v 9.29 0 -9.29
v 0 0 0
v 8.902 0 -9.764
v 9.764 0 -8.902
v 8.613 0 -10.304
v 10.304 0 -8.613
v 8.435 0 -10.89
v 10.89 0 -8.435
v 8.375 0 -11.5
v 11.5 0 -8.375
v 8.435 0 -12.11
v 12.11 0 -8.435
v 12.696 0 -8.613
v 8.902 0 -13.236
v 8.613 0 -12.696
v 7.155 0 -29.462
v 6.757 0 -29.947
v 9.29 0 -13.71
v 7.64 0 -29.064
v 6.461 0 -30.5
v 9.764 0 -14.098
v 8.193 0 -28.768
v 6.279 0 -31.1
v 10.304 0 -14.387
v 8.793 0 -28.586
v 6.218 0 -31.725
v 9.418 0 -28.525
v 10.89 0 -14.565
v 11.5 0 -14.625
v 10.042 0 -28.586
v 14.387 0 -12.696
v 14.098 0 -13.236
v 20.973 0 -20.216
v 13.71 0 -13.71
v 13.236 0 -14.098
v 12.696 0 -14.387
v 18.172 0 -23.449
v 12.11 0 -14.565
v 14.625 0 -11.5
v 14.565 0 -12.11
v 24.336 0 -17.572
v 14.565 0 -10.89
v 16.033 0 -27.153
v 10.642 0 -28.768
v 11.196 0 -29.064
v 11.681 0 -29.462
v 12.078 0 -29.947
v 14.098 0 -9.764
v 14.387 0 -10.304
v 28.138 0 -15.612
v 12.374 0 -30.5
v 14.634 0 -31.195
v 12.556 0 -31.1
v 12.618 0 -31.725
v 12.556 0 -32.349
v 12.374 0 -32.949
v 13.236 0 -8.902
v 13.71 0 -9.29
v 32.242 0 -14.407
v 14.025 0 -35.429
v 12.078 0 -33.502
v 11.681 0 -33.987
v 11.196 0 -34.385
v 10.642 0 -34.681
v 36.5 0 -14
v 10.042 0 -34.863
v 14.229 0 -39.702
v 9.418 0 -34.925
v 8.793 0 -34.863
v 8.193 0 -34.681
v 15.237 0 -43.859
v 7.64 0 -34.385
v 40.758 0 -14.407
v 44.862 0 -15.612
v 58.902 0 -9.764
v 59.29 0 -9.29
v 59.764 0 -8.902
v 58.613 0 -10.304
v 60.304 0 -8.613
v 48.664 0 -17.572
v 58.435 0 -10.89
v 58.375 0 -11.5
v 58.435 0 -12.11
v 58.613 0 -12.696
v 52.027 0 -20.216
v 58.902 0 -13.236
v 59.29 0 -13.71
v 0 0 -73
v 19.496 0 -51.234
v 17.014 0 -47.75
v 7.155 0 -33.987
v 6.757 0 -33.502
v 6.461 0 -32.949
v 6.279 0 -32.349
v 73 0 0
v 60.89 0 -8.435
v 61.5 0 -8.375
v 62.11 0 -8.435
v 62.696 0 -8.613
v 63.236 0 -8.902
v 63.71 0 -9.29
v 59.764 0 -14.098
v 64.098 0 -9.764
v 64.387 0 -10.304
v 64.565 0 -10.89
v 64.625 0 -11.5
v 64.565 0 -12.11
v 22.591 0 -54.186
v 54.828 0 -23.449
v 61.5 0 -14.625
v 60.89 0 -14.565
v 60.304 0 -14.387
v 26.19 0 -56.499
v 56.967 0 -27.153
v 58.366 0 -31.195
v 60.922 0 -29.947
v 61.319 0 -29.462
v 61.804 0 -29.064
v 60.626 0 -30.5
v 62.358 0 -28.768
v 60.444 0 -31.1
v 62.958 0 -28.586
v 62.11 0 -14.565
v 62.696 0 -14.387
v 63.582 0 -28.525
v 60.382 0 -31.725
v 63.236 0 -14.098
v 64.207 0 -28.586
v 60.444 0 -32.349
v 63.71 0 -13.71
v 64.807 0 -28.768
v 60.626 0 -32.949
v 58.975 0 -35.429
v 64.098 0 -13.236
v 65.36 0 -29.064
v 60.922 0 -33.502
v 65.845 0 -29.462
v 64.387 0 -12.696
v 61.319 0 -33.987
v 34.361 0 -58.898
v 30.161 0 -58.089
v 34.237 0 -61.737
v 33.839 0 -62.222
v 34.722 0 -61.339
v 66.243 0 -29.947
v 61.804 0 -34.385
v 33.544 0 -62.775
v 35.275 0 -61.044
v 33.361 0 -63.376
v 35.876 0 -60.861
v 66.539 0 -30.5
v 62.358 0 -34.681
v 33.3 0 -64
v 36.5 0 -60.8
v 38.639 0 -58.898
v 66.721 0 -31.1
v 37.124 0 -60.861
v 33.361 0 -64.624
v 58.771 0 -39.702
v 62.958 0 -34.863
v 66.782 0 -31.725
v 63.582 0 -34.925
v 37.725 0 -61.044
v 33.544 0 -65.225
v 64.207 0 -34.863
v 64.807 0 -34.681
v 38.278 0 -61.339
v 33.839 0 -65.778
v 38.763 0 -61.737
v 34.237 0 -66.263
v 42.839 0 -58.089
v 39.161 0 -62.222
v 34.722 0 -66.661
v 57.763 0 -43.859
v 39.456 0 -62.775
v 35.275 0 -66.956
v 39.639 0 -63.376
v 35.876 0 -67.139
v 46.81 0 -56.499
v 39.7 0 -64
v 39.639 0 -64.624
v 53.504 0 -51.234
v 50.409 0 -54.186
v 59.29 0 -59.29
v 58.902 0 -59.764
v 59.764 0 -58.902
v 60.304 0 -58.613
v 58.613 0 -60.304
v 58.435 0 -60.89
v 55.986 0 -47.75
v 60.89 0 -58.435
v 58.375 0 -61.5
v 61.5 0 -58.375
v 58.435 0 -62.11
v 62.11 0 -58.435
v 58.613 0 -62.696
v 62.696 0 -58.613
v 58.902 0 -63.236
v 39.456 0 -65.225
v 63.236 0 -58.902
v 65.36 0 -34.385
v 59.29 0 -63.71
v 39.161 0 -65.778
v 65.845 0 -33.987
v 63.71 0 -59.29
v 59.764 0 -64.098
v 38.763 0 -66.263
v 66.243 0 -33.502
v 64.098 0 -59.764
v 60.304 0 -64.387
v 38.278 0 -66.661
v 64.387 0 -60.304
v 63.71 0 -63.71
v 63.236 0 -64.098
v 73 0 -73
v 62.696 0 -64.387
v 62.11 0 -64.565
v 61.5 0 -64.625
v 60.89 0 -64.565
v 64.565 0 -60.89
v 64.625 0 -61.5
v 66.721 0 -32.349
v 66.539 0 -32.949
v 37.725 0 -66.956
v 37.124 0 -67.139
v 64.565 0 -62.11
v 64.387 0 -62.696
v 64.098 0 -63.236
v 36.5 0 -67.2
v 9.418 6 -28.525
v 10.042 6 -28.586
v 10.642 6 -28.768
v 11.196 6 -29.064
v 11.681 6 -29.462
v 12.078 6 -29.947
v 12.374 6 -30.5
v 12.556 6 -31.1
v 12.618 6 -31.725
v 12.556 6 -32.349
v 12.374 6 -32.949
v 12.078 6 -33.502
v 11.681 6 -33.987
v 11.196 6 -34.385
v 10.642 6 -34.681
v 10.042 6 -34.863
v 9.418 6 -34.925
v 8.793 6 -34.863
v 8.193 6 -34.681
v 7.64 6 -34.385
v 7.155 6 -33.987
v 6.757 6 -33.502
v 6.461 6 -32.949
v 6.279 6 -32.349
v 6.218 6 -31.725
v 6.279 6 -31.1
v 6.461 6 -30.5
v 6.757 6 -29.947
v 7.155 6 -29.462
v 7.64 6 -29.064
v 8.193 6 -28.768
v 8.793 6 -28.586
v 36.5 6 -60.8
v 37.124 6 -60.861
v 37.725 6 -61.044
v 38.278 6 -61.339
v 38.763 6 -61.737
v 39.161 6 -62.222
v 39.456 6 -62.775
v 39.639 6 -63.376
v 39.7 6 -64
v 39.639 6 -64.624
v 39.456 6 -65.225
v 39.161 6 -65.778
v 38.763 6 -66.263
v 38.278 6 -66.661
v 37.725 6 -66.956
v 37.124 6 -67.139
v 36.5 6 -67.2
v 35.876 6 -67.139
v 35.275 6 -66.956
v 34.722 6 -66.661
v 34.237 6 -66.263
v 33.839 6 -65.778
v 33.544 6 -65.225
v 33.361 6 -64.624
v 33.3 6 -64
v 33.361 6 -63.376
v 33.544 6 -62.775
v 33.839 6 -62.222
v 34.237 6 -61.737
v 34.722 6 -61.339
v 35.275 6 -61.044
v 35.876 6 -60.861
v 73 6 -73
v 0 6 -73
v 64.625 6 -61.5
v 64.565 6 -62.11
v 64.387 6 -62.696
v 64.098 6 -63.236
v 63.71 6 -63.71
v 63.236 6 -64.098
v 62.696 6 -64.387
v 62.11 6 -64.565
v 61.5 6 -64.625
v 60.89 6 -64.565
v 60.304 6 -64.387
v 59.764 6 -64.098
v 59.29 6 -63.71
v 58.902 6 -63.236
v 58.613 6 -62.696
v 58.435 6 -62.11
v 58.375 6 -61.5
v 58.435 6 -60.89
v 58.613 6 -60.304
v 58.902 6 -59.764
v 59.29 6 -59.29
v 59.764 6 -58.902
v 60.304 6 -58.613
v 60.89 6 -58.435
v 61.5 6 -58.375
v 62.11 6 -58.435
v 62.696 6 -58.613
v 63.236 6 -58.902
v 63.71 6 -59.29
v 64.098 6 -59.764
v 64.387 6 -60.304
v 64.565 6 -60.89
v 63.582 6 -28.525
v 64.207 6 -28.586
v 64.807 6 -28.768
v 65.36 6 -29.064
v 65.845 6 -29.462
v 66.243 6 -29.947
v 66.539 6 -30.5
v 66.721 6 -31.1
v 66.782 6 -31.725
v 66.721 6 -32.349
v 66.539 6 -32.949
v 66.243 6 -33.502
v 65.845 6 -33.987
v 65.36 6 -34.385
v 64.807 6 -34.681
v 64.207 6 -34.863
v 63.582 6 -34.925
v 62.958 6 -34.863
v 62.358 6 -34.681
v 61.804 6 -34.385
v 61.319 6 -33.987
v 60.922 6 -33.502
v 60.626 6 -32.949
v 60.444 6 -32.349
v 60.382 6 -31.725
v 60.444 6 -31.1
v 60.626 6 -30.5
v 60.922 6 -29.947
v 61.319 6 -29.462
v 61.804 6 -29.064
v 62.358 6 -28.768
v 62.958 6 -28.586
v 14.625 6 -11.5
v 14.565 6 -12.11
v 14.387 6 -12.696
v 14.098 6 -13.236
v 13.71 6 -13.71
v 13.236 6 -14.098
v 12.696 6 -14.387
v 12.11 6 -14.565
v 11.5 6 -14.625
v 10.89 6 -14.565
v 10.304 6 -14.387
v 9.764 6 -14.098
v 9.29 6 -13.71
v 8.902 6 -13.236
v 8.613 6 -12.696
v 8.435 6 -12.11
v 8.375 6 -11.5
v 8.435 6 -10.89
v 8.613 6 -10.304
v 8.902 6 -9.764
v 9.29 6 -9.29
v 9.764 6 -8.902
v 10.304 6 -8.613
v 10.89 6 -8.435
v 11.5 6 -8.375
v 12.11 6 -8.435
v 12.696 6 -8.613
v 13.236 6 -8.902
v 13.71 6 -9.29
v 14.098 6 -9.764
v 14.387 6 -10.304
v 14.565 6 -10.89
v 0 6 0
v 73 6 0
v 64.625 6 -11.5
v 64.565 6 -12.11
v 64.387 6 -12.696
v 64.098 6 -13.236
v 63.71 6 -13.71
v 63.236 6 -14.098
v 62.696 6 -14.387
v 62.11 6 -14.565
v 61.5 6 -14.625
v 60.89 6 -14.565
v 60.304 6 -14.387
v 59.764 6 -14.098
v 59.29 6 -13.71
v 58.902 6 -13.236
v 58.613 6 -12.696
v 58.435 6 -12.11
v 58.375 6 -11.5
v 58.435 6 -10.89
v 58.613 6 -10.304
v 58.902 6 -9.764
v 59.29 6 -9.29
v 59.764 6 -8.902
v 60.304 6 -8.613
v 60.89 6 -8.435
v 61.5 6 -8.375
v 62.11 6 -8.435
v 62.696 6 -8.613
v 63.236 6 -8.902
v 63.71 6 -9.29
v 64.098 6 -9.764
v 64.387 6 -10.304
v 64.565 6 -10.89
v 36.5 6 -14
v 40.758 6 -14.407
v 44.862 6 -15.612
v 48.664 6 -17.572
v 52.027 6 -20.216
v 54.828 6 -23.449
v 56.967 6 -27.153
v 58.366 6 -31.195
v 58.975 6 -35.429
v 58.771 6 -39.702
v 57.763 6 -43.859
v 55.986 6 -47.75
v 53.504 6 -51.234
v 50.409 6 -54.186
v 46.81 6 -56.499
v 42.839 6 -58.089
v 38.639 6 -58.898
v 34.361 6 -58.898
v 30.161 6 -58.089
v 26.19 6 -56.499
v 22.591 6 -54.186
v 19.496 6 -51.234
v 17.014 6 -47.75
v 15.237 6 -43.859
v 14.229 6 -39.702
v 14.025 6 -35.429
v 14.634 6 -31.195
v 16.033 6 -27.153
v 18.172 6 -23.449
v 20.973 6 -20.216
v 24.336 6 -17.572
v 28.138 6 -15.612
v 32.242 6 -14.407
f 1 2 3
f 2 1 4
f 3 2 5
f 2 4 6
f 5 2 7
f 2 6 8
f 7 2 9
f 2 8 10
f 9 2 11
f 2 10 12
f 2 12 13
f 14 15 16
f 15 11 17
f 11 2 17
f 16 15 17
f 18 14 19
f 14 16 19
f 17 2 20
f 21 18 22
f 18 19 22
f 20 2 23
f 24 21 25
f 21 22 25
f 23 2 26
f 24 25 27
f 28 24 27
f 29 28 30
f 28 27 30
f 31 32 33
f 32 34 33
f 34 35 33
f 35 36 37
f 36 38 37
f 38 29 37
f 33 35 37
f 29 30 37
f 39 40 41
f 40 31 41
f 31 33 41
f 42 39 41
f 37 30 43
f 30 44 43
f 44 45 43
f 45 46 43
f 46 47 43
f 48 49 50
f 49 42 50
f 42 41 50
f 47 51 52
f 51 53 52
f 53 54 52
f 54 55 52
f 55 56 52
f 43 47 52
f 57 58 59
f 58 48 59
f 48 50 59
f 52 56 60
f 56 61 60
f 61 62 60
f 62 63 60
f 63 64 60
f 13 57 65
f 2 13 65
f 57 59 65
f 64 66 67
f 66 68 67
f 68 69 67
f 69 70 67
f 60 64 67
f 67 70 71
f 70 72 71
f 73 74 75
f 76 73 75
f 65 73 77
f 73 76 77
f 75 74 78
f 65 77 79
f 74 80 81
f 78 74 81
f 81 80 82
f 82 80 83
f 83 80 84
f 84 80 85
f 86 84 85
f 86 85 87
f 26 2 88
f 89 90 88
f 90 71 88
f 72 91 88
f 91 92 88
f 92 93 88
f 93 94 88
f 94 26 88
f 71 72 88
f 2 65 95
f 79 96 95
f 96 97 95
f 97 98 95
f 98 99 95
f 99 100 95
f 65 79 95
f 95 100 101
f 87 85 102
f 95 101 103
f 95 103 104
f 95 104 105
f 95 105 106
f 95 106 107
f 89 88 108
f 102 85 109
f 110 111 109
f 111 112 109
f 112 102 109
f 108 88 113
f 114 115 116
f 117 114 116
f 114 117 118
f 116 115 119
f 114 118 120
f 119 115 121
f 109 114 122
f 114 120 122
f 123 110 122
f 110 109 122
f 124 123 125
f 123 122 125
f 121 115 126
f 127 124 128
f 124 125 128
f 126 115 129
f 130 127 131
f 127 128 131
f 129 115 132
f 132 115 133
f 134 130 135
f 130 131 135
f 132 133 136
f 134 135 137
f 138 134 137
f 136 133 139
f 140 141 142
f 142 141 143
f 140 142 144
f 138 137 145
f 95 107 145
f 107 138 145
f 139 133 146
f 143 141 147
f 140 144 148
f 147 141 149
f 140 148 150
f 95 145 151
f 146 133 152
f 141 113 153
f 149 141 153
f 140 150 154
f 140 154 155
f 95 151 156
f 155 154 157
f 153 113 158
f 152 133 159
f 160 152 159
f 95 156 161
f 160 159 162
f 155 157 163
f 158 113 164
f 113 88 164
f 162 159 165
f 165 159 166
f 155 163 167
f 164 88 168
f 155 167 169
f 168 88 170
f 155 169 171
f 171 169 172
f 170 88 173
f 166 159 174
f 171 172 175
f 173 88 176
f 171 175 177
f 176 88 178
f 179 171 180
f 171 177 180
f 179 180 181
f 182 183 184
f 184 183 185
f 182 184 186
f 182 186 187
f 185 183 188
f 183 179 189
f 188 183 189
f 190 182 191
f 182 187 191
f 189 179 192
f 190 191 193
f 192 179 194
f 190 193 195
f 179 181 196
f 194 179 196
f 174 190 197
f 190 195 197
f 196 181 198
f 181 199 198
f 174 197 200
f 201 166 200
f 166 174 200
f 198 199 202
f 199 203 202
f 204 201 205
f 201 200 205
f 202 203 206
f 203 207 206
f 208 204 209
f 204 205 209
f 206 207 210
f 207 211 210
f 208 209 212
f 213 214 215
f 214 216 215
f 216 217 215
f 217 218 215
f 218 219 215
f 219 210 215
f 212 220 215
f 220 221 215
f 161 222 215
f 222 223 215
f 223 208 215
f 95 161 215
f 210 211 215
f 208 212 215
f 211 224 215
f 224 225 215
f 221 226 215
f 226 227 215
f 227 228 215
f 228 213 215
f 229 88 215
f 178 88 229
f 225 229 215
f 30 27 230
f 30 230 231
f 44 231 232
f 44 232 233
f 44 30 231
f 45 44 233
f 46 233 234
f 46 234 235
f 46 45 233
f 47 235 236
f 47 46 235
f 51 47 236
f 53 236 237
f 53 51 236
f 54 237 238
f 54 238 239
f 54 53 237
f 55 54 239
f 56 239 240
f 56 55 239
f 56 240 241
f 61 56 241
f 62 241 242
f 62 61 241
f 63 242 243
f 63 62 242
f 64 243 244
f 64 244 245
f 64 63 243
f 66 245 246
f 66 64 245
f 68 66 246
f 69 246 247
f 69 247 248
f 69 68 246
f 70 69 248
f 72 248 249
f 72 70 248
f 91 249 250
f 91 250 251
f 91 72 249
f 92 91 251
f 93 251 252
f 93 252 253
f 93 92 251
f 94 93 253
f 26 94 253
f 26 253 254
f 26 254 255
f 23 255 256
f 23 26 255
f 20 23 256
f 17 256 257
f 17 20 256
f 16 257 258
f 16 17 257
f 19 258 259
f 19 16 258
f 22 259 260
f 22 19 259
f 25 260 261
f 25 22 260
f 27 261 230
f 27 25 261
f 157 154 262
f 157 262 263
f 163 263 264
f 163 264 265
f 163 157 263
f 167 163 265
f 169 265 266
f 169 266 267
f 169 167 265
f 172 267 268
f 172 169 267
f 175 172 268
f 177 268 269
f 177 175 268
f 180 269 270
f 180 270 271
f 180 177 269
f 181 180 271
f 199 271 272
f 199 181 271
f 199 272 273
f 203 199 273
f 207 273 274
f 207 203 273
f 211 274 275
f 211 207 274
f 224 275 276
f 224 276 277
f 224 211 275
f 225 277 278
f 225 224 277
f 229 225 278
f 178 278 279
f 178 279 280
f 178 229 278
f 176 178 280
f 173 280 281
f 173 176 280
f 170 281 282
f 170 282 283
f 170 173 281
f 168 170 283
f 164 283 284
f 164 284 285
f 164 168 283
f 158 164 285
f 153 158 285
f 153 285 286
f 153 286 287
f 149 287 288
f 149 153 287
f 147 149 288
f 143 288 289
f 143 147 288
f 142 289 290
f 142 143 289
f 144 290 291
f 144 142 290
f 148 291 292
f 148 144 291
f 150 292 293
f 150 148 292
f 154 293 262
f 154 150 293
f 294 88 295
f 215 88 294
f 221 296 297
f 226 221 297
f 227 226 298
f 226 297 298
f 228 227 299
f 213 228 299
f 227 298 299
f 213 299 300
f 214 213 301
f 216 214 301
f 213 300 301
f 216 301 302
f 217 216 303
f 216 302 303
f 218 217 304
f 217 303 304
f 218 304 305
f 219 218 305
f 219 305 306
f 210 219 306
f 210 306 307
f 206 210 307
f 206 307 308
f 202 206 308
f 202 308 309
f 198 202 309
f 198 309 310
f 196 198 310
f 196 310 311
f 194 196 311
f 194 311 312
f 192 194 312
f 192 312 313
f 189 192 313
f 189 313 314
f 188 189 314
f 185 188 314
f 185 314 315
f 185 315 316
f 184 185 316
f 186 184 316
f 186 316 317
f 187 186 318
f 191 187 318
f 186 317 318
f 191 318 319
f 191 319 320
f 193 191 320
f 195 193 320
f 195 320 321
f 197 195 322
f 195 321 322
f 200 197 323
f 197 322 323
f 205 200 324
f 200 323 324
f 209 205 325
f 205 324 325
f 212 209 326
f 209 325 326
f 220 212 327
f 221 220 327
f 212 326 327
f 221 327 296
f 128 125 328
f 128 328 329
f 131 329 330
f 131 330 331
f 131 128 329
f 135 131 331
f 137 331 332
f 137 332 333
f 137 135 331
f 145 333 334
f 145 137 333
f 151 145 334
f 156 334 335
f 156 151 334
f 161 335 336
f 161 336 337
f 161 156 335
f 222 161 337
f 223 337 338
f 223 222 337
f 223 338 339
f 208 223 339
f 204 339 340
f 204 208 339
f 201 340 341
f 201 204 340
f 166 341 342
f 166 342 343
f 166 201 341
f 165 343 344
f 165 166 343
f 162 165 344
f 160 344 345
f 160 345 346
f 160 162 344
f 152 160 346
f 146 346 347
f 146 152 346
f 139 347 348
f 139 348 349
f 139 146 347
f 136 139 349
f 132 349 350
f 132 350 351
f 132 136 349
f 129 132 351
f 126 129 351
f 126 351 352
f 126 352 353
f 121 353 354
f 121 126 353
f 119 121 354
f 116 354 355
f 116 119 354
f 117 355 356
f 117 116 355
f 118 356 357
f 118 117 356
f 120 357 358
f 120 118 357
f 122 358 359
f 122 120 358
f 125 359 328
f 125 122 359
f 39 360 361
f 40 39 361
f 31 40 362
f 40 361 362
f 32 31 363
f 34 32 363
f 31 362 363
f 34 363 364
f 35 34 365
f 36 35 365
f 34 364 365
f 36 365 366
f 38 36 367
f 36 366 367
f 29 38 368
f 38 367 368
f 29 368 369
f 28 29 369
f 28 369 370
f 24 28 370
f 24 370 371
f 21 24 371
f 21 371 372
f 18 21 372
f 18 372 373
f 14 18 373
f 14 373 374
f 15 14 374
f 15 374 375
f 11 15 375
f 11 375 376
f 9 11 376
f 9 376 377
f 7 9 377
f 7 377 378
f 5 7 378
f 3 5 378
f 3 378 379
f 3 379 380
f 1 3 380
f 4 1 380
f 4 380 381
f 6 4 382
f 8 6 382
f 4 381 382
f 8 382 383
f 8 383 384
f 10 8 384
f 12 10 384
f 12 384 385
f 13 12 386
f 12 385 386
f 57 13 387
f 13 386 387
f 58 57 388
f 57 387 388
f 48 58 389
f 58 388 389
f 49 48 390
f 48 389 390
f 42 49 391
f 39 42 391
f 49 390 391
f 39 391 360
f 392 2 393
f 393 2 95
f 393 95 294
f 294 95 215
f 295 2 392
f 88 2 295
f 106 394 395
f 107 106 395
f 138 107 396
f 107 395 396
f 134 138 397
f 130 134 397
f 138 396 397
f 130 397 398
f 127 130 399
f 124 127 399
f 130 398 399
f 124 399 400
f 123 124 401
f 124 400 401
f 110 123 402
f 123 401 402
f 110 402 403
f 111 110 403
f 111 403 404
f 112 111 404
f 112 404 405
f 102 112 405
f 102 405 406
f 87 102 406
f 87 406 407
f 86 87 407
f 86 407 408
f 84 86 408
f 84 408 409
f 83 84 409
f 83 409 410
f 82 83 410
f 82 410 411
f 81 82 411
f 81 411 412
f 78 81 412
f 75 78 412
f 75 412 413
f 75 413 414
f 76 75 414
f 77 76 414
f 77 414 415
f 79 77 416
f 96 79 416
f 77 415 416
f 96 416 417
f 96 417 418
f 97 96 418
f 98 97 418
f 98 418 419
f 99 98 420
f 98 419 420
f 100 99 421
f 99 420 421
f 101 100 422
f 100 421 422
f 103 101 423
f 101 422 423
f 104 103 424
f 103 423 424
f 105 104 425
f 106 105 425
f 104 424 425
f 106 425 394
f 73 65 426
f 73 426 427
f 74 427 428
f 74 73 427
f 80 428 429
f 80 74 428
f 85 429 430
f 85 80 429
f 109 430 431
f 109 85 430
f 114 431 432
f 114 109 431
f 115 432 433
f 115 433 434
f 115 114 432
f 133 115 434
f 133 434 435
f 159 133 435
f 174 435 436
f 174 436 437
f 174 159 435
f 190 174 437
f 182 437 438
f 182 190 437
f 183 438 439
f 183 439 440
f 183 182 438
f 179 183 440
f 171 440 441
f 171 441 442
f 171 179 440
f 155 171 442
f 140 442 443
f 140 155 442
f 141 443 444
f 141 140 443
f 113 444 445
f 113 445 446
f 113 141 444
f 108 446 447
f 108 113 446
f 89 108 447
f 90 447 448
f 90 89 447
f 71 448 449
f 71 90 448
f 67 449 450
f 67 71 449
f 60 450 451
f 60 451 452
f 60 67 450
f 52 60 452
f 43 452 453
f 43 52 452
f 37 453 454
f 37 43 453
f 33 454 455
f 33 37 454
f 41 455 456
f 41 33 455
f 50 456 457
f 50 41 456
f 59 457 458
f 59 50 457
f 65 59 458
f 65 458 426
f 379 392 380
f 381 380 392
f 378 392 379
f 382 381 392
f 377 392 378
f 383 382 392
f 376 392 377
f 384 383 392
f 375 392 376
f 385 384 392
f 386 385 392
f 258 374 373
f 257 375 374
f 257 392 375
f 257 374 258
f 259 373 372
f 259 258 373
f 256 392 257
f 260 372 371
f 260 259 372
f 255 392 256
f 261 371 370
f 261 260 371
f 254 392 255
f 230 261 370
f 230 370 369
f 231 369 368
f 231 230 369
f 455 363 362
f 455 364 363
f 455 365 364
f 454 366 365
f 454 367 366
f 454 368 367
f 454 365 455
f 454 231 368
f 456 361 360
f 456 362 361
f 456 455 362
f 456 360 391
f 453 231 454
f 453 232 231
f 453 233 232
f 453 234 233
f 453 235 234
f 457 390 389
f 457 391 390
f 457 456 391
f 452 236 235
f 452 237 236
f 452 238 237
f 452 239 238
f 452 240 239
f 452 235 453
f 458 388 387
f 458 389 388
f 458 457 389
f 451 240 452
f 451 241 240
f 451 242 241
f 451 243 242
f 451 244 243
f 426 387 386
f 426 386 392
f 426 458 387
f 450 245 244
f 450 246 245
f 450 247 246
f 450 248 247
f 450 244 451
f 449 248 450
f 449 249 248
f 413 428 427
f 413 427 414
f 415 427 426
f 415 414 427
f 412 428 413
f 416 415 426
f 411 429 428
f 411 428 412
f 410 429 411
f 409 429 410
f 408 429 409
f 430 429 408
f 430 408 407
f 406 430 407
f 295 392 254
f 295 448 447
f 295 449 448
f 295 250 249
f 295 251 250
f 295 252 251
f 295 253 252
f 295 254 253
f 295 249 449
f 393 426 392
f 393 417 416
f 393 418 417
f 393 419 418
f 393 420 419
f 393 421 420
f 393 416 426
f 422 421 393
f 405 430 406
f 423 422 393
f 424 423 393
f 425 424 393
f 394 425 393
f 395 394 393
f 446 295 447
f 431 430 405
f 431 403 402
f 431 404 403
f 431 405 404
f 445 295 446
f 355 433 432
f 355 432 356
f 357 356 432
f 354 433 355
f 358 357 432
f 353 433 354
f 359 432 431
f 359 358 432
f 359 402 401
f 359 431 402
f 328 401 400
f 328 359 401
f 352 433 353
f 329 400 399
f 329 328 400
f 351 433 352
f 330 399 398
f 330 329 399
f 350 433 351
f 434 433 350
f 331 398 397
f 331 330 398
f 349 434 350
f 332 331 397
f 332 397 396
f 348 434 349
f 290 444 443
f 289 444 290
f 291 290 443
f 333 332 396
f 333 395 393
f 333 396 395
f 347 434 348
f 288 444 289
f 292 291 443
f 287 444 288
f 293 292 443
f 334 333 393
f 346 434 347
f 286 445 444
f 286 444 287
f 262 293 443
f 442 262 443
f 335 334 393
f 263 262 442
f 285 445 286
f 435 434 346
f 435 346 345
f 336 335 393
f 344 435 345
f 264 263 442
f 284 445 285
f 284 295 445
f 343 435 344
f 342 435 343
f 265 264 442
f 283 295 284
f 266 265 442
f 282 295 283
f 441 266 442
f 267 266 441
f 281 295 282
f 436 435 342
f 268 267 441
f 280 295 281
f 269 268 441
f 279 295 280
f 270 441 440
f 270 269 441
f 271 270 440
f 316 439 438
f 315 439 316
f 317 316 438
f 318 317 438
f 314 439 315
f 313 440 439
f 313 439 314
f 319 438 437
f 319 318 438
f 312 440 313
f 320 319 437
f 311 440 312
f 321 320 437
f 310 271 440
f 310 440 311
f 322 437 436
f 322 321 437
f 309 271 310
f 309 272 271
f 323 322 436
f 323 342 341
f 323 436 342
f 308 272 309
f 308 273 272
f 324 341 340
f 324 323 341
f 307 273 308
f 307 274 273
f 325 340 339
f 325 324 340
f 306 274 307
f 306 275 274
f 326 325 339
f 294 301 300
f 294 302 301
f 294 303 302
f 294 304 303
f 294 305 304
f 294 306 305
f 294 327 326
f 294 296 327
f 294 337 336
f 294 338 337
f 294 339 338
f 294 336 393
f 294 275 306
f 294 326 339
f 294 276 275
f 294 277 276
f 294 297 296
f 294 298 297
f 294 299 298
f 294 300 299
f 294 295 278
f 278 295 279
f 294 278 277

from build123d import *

# Parameters (mm, degrees)
SKETCH1_W                        = 73
SKETCH1_H                        = 73
SKETCH1_R                        = 3.2
SKETCH1_R_2                      = 22.5
BOSS_EXTRUDE1_DEPTH              = 6
TAP_DRILL_FOR_M6_HELICOIL1_D     = 6.25
TAP_DRILL_FOR_M6_HELICOIL1_DEPTH = 11.94
TAP_DRILL_FOR_M6_HELICOIL1_TIP   = 1.877689434


with BuildPart() as part:
    # Sketch1 → Boss-Extrude1 (new body)
    with BuildSketch(Plane(origin=(0, 0, 0), x_dir=(1, 0, 0), z_dir=(0, 1, 0))):
        with Locations((36.5, 36.5)):
            Rectangle(SKETCH1_W, SKETCH1_H)
        with Locations(Location((36.5, 64, 0), (0, 0, 270))):
            Circle(SKETCH1_R, mode=Mode.SUBTRACT)
        with Locations(Location((63.582213208, 31.724675114, 0), (0, 0, 270))):
            Circle(SKETCH1_R, mode=Mode.SUBTRACT)
        with Locations(Location((9.417786792, 31.724675114, 0), (0, 0, 270))):
            Circle(SKETCH1_R, mode=Mode.SUBTRACT)
        with Locations(Location((36.5, 36.5, 0), (0, 0, 270))):
            Circle(SKETCH1_R_2, mode=Mode.SUBTRACT)
    extrude(amount=BOSS_EXTRUDE1_DEPTH)

    # Tap Drill for M6 Helicoil1
    with Locations(Plane(origin=(0, 0, 0), x_dir=(-1, 0, 0), z_dir=(0, -1, 0))):
        with Locations((-11.5, 11.5), (-61.5, 11.5), (-61.5, 61.5)):
            Hole(TAP_DRILL_FOR_M6_HELICOIL1_D / 2, depth=TAP_DRILL_FOR_M6_HELICOIL1_DEPTH)
            with Locations((0, 0, -(TAP_DRILL_FOR_M6_HELICOIL1_DEPTH + TAP_DRILL_FOR_M6_HELICOIL1_TIP / 2))):  # 118° drill point
                Cone(0, TAP_DRILL_FOR_M6_HELICOIL1_D / 2, TAP_DRILL_FOR_M6_HELICOIL1_TIP, mode=Mode.SUBTRACT)


solid = part.part
